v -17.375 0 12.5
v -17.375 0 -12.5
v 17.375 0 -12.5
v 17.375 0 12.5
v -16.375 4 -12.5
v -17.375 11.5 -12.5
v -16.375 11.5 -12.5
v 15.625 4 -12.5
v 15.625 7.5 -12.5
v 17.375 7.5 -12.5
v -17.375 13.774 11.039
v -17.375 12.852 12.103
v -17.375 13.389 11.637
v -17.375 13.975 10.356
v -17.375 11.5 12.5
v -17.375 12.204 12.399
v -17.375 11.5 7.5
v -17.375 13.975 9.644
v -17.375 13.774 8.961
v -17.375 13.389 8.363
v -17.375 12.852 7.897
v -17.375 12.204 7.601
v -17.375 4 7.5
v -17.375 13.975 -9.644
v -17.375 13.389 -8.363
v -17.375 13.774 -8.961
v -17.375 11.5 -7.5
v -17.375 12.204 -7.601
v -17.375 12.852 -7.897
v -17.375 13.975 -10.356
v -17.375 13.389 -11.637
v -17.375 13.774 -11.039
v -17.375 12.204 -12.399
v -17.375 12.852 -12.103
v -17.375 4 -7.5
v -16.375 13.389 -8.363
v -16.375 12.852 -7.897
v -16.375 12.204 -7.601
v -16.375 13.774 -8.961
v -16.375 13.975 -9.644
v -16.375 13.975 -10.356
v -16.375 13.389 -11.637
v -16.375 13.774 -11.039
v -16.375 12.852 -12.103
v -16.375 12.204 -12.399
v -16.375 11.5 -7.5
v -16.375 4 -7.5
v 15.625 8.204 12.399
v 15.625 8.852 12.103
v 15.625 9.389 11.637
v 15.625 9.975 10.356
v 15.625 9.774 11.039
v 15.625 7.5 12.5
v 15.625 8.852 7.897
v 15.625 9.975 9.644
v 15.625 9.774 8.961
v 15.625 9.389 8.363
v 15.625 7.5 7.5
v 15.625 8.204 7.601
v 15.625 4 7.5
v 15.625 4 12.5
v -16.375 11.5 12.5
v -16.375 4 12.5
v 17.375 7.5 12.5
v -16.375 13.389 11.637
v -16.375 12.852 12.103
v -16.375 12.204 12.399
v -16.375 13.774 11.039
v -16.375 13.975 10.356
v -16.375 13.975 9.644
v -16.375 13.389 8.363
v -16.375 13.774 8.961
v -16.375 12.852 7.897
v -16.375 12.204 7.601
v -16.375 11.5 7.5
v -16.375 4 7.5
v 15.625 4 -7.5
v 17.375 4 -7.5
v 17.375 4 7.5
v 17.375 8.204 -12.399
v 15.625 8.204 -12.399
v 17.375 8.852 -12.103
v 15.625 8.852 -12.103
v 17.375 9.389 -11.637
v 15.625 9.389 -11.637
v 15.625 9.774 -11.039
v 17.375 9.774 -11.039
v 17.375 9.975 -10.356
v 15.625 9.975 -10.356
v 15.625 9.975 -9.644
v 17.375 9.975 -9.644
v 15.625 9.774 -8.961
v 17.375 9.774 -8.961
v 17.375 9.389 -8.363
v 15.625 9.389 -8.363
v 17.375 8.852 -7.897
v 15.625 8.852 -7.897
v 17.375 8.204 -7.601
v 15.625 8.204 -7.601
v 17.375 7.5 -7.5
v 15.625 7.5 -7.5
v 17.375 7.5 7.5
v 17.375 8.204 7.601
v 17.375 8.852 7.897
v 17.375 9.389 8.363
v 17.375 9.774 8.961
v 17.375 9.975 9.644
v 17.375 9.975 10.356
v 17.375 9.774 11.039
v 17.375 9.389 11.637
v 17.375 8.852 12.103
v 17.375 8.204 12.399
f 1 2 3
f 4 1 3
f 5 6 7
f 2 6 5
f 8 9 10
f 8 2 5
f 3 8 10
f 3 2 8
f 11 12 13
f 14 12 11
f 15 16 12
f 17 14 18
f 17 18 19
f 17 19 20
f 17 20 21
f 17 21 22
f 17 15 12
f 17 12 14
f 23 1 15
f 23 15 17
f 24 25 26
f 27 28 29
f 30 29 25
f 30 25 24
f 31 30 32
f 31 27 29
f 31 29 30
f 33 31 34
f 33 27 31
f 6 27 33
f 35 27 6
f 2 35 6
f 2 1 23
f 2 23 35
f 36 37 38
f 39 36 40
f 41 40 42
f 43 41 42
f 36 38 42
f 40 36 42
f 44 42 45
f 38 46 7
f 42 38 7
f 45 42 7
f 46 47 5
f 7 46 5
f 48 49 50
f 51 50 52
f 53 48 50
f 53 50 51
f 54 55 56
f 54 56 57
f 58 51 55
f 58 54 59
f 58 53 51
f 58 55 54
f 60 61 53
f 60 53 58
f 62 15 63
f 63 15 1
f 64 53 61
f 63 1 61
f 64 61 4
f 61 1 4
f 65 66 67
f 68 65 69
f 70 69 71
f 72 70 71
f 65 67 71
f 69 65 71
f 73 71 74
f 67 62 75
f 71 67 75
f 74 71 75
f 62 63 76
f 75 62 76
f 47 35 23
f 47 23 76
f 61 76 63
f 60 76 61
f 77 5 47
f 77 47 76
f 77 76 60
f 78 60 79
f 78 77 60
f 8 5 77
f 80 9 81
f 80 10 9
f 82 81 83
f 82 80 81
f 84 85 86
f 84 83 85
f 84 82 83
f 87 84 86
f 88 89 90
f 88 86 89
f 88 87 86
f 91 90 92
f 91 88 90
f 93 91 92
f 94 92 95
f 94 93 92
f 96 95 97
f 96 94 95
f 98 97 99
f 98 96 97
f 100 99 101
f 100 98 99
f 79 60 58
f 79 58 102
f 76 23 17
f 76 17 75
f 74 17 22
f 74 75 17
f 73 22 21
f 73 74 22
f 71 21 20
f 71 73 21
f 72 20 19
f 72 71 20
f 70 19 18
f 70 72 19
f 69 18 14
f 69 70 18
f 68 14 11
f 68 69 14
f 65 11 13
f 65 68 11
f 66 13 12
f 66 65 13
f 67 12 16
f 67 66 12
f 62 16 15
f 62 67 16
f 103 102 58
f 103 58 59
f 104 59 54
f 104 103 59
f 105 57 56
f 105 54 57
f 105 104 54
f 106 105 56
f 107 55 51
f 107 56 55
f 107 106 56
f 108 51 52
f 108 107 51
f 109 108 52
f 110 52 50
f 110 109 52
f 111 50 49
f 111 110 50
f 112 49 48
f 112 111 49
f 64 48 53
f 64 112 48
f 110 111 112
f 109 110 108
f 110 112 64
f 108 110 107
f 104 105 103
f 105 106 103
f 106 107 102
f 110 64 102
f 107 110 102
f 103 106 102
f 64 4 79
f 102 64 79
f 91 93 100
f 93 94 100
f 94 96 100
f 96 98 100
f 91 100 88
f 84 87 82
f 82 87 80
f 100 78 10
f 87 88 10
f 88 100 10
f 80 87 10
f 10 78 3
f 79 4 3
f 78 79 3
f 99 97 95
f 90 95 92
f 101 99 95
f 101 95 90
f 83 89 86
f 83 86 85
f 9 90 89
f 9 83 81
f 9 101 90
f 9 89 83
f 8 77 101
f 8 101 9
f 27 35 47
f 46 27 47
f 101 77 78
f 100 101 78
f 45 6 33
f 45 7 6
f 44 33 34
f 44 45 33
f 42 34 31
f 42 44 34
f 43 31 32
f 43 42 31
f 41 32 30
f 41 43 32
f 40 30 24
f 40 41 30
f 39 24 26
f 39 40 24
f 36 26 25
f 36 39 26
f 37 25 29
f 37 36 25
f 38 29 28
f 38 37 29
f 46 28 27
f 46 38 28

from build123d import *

# Parameters (mm, degrees)
SKETCH1_W           = 34.75
SKETCH1_H           = 25
BOSS_EXTRUDE1_DEPTH = 4
SKETCH2_W           = 1.75
SKETCH2_H           = 5
BOSS_EXTRUDE2_DEPTH = 6
SKETCH4_W           = 1
SKETCH4_H           = 5
BOSS_EXTRUDE3_DEPTH = 10
FILLET2_RADIUS      = 2.5
FILLET2_LENGTH      = 1
FILLET3_RADIUS      = 2.5
FILLET3_LENGTH      = 1
FILLET4_RADIUS      = 2.5
FILLET4_LENGTH      = 1.75
FILLET5_RADIUS      = 2.5
FILLET5_LENGTH      = 1.75


with BuildPart() as part:
    # Sketch1 → Boss-Extrude1 (new body)
    with BuildSketch(Plane(origin=(0, 0, 0), x_dir=(1, 0, 0), z_dir=(0, 1, 0))):
        Rectangle(SKETCH1_W, SKETCH1_H)
    extrude(amount=BOSS_EXTRUDE1_DEPTH)

    # Sketch2 → Boss-Extrude2 (add)
    with BuildSketch(Plane(origin=(0, 4, 0), x_dir=(1, 0, 0), z_dir=(0, 1, 0))):
        with Locations((16.5, -10)):
            Rectangle(SKETCH2_W, SKETCH2_H)
        with Locations((16.5, 10)):
            Rectangle(SKETCH2_W, SKETCH2_H)
    extrude(amount=BOSS_EXTRUDE2_DEPTH)

    # Sketch4 → Boss-Extrude3 (add)
    with BuildSketch(Plane(origin=(0, 4, 0), x_dir=(1, 0, 0), z_dir=(0, 1, 0))):
        with Locations((-16.875, 10)):
            Rectangle(SKETCH4_W, SKETCH4_H)
        with Locations((-16.875, -10)):
            Rectangle(SKETCH4_W, SKETCH4_H)
    extrude(amount=BOSS_EXTRUDE3_DEPTH)

    # Fillet2: full round fillet: the end face becomes a half cylinder, R = half its width
    fillet2_face = Plane((-16.875, 14, -10), x_dir=(1, 0, 0), z_dir=(0, 1, 0))  # on the end face: x along it, z out of the body
    fillet2_slab = fillet2_face.offset(-FILLET2_RADIUS / 2) * Box(FILLET2_LENGTH, 2 * FILLET2_RADIUS, FILLET2_RADIUS, mode=Mode.PRIVATE)  # the body's end, R deep
    fillet2_round = Plane((-16.875, 11.5, -10), x_dir=(0, 1, 0), z_dir=(1, 0, 0)) * Cylinder(FILLET2_RADIUS, FILLET2_LENGTH, mode=Mode.PRIVATE)  # its axis R under the face
    add(fillet2_slab - fillet2_round, mode=Mode.SUBTRACT)

    # Fillet3: full round fillet: the end face becomes a half cylinder, R = half its width
    fillet3_face = Plane((-16.875, 14, 10), x_dir=(1, 0, 0), z_dir=(0, 1, 0))  # on the end face: x along it, z out of the body
    fillet3_slab = fillet3_face.offset(-FILLET3_RADIUS / 2) * Box(FILLET3_LENGTH, 2 * FILLET3_RADIUS, FILLET3_RADIUS, mode=Mode.PRIVATE)  # the body's end, R deep
    fillet3_round = Plane((-16.875, 11.5, 10), x_dir=(0, 1, 0), z_dir=(1, 0, 0)) * Cylinder(FILLET3_RADIUS, FILLET3_LENGTH, mode=Mode.PRIVATE)  # its axis R under the face
    add(fillet3_slab - fillet3_round, mode=Mode.SUBTRACT)

    # Fillet4: full round fillet: the end face becomes a half cylinder, R = half its width
    fillet4_face = Plane((16.5, 10, -10), x_dir=(1, 0, 0), z_dir=(0, 1, 0))  # on the end face: x along it, z out of the body
    fillet4_slab = fillet4_face.offset(-FILLET4_RADIUS / 2) * Box(FILLET4_LENGTH, 2 * FILLET4_RADIUS, FILLET4_RADIUS, mode=Mode.PRIVATE)  # the body's end, R deep
    fillet4_round = Plane((16.5, 7.5, -10), x_dir=(0, 1, 0), z_dir=(1, 0, 0)) * Cylinder(FILLET4_RADIUS, FILLET4_LENGTH, mode=Mode.PRIVATE)  # its axis R under the face
    add(fillet4_slab - fillet4_round, mode=Mode.SUBTRACT)

    # Fillet5: full round fillet: the end face becomes a half cylinder, R = half its width
    fillet5_face = Plane((16.5, 10, 10), x_dir=(1, 0, 0), z_dir=(0, 1, 0))  # on the end face: x along it, z out of the body
    fillet5_slab = fillet5_face.offset(-FILLET5_RADIUS / 2) * Box(FILLET5_LENGTH, 2 * FILLET5_RADIUS, FILLET5_RADIUS, mode=Mode.PRIVATE)  # the body's end, R deep
    fillet5_round = Plane((16.5, 7.5, 10), x_dir=(0, 1, 0), z_dir=(1, 0, 0)) * Cylinder(FILLET5_RADIUS, FILLET5_LENGTH, mode=Mode.PRIVATE)  # its axis R under the face
    add(fillet5_slab - fillet5_round, mode=Mode.SUBTRACT)


solid = part.part
